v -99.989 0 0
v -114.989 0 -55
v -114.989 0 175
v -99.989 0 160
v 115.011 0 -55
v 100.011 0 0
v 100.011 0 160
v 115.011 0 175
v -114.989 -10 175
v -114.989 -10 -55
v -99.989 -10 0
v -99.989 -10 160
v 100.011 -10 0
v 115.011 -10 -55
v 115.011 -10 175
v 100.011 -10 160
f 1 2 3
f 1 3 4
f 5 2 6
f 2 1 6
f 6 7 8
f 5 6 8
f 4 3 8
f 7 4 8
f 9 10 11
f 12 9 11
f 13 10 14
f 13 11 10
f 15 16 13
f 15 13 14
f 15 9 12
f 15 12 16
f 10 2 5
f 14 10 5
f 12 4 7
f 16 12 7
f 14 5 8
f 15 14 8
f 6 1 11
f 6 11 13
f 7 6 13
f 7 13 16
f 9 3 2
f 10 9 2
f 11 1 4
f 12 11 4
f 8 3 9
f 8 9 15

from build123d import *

# Parameters (mm, degrees)
F0_W     = 230
F0_H     = 40
F0_H_2   = 190
F0_W_2   = 200
F0_H_3   = 159.9997122972
F1_DEPTH = 10


# Not quite as in the source:
# - a feature names something its author has since deleted; it is built from what else it names


with BuildPart() as f1:
    # F0 (on Front) → F1 (new body)
    with BuildSketch(Plane.XZ):
        with Locations((0.0107780099, -35.0002877028)):
            Rectangle(F0_W, F0_H)
        with Locations((0.0107780099, 79.9997122972)):
            Rectangle(F0_W, F0_H_2)
        with Locations((0.0107780099, 79.9998561486)):
            Rectangle(F0_W_2, F0_H_3, mode=Mode.SUBTRACT)
    extrude(amount=F1_DEPTH)


solid = f1.part
